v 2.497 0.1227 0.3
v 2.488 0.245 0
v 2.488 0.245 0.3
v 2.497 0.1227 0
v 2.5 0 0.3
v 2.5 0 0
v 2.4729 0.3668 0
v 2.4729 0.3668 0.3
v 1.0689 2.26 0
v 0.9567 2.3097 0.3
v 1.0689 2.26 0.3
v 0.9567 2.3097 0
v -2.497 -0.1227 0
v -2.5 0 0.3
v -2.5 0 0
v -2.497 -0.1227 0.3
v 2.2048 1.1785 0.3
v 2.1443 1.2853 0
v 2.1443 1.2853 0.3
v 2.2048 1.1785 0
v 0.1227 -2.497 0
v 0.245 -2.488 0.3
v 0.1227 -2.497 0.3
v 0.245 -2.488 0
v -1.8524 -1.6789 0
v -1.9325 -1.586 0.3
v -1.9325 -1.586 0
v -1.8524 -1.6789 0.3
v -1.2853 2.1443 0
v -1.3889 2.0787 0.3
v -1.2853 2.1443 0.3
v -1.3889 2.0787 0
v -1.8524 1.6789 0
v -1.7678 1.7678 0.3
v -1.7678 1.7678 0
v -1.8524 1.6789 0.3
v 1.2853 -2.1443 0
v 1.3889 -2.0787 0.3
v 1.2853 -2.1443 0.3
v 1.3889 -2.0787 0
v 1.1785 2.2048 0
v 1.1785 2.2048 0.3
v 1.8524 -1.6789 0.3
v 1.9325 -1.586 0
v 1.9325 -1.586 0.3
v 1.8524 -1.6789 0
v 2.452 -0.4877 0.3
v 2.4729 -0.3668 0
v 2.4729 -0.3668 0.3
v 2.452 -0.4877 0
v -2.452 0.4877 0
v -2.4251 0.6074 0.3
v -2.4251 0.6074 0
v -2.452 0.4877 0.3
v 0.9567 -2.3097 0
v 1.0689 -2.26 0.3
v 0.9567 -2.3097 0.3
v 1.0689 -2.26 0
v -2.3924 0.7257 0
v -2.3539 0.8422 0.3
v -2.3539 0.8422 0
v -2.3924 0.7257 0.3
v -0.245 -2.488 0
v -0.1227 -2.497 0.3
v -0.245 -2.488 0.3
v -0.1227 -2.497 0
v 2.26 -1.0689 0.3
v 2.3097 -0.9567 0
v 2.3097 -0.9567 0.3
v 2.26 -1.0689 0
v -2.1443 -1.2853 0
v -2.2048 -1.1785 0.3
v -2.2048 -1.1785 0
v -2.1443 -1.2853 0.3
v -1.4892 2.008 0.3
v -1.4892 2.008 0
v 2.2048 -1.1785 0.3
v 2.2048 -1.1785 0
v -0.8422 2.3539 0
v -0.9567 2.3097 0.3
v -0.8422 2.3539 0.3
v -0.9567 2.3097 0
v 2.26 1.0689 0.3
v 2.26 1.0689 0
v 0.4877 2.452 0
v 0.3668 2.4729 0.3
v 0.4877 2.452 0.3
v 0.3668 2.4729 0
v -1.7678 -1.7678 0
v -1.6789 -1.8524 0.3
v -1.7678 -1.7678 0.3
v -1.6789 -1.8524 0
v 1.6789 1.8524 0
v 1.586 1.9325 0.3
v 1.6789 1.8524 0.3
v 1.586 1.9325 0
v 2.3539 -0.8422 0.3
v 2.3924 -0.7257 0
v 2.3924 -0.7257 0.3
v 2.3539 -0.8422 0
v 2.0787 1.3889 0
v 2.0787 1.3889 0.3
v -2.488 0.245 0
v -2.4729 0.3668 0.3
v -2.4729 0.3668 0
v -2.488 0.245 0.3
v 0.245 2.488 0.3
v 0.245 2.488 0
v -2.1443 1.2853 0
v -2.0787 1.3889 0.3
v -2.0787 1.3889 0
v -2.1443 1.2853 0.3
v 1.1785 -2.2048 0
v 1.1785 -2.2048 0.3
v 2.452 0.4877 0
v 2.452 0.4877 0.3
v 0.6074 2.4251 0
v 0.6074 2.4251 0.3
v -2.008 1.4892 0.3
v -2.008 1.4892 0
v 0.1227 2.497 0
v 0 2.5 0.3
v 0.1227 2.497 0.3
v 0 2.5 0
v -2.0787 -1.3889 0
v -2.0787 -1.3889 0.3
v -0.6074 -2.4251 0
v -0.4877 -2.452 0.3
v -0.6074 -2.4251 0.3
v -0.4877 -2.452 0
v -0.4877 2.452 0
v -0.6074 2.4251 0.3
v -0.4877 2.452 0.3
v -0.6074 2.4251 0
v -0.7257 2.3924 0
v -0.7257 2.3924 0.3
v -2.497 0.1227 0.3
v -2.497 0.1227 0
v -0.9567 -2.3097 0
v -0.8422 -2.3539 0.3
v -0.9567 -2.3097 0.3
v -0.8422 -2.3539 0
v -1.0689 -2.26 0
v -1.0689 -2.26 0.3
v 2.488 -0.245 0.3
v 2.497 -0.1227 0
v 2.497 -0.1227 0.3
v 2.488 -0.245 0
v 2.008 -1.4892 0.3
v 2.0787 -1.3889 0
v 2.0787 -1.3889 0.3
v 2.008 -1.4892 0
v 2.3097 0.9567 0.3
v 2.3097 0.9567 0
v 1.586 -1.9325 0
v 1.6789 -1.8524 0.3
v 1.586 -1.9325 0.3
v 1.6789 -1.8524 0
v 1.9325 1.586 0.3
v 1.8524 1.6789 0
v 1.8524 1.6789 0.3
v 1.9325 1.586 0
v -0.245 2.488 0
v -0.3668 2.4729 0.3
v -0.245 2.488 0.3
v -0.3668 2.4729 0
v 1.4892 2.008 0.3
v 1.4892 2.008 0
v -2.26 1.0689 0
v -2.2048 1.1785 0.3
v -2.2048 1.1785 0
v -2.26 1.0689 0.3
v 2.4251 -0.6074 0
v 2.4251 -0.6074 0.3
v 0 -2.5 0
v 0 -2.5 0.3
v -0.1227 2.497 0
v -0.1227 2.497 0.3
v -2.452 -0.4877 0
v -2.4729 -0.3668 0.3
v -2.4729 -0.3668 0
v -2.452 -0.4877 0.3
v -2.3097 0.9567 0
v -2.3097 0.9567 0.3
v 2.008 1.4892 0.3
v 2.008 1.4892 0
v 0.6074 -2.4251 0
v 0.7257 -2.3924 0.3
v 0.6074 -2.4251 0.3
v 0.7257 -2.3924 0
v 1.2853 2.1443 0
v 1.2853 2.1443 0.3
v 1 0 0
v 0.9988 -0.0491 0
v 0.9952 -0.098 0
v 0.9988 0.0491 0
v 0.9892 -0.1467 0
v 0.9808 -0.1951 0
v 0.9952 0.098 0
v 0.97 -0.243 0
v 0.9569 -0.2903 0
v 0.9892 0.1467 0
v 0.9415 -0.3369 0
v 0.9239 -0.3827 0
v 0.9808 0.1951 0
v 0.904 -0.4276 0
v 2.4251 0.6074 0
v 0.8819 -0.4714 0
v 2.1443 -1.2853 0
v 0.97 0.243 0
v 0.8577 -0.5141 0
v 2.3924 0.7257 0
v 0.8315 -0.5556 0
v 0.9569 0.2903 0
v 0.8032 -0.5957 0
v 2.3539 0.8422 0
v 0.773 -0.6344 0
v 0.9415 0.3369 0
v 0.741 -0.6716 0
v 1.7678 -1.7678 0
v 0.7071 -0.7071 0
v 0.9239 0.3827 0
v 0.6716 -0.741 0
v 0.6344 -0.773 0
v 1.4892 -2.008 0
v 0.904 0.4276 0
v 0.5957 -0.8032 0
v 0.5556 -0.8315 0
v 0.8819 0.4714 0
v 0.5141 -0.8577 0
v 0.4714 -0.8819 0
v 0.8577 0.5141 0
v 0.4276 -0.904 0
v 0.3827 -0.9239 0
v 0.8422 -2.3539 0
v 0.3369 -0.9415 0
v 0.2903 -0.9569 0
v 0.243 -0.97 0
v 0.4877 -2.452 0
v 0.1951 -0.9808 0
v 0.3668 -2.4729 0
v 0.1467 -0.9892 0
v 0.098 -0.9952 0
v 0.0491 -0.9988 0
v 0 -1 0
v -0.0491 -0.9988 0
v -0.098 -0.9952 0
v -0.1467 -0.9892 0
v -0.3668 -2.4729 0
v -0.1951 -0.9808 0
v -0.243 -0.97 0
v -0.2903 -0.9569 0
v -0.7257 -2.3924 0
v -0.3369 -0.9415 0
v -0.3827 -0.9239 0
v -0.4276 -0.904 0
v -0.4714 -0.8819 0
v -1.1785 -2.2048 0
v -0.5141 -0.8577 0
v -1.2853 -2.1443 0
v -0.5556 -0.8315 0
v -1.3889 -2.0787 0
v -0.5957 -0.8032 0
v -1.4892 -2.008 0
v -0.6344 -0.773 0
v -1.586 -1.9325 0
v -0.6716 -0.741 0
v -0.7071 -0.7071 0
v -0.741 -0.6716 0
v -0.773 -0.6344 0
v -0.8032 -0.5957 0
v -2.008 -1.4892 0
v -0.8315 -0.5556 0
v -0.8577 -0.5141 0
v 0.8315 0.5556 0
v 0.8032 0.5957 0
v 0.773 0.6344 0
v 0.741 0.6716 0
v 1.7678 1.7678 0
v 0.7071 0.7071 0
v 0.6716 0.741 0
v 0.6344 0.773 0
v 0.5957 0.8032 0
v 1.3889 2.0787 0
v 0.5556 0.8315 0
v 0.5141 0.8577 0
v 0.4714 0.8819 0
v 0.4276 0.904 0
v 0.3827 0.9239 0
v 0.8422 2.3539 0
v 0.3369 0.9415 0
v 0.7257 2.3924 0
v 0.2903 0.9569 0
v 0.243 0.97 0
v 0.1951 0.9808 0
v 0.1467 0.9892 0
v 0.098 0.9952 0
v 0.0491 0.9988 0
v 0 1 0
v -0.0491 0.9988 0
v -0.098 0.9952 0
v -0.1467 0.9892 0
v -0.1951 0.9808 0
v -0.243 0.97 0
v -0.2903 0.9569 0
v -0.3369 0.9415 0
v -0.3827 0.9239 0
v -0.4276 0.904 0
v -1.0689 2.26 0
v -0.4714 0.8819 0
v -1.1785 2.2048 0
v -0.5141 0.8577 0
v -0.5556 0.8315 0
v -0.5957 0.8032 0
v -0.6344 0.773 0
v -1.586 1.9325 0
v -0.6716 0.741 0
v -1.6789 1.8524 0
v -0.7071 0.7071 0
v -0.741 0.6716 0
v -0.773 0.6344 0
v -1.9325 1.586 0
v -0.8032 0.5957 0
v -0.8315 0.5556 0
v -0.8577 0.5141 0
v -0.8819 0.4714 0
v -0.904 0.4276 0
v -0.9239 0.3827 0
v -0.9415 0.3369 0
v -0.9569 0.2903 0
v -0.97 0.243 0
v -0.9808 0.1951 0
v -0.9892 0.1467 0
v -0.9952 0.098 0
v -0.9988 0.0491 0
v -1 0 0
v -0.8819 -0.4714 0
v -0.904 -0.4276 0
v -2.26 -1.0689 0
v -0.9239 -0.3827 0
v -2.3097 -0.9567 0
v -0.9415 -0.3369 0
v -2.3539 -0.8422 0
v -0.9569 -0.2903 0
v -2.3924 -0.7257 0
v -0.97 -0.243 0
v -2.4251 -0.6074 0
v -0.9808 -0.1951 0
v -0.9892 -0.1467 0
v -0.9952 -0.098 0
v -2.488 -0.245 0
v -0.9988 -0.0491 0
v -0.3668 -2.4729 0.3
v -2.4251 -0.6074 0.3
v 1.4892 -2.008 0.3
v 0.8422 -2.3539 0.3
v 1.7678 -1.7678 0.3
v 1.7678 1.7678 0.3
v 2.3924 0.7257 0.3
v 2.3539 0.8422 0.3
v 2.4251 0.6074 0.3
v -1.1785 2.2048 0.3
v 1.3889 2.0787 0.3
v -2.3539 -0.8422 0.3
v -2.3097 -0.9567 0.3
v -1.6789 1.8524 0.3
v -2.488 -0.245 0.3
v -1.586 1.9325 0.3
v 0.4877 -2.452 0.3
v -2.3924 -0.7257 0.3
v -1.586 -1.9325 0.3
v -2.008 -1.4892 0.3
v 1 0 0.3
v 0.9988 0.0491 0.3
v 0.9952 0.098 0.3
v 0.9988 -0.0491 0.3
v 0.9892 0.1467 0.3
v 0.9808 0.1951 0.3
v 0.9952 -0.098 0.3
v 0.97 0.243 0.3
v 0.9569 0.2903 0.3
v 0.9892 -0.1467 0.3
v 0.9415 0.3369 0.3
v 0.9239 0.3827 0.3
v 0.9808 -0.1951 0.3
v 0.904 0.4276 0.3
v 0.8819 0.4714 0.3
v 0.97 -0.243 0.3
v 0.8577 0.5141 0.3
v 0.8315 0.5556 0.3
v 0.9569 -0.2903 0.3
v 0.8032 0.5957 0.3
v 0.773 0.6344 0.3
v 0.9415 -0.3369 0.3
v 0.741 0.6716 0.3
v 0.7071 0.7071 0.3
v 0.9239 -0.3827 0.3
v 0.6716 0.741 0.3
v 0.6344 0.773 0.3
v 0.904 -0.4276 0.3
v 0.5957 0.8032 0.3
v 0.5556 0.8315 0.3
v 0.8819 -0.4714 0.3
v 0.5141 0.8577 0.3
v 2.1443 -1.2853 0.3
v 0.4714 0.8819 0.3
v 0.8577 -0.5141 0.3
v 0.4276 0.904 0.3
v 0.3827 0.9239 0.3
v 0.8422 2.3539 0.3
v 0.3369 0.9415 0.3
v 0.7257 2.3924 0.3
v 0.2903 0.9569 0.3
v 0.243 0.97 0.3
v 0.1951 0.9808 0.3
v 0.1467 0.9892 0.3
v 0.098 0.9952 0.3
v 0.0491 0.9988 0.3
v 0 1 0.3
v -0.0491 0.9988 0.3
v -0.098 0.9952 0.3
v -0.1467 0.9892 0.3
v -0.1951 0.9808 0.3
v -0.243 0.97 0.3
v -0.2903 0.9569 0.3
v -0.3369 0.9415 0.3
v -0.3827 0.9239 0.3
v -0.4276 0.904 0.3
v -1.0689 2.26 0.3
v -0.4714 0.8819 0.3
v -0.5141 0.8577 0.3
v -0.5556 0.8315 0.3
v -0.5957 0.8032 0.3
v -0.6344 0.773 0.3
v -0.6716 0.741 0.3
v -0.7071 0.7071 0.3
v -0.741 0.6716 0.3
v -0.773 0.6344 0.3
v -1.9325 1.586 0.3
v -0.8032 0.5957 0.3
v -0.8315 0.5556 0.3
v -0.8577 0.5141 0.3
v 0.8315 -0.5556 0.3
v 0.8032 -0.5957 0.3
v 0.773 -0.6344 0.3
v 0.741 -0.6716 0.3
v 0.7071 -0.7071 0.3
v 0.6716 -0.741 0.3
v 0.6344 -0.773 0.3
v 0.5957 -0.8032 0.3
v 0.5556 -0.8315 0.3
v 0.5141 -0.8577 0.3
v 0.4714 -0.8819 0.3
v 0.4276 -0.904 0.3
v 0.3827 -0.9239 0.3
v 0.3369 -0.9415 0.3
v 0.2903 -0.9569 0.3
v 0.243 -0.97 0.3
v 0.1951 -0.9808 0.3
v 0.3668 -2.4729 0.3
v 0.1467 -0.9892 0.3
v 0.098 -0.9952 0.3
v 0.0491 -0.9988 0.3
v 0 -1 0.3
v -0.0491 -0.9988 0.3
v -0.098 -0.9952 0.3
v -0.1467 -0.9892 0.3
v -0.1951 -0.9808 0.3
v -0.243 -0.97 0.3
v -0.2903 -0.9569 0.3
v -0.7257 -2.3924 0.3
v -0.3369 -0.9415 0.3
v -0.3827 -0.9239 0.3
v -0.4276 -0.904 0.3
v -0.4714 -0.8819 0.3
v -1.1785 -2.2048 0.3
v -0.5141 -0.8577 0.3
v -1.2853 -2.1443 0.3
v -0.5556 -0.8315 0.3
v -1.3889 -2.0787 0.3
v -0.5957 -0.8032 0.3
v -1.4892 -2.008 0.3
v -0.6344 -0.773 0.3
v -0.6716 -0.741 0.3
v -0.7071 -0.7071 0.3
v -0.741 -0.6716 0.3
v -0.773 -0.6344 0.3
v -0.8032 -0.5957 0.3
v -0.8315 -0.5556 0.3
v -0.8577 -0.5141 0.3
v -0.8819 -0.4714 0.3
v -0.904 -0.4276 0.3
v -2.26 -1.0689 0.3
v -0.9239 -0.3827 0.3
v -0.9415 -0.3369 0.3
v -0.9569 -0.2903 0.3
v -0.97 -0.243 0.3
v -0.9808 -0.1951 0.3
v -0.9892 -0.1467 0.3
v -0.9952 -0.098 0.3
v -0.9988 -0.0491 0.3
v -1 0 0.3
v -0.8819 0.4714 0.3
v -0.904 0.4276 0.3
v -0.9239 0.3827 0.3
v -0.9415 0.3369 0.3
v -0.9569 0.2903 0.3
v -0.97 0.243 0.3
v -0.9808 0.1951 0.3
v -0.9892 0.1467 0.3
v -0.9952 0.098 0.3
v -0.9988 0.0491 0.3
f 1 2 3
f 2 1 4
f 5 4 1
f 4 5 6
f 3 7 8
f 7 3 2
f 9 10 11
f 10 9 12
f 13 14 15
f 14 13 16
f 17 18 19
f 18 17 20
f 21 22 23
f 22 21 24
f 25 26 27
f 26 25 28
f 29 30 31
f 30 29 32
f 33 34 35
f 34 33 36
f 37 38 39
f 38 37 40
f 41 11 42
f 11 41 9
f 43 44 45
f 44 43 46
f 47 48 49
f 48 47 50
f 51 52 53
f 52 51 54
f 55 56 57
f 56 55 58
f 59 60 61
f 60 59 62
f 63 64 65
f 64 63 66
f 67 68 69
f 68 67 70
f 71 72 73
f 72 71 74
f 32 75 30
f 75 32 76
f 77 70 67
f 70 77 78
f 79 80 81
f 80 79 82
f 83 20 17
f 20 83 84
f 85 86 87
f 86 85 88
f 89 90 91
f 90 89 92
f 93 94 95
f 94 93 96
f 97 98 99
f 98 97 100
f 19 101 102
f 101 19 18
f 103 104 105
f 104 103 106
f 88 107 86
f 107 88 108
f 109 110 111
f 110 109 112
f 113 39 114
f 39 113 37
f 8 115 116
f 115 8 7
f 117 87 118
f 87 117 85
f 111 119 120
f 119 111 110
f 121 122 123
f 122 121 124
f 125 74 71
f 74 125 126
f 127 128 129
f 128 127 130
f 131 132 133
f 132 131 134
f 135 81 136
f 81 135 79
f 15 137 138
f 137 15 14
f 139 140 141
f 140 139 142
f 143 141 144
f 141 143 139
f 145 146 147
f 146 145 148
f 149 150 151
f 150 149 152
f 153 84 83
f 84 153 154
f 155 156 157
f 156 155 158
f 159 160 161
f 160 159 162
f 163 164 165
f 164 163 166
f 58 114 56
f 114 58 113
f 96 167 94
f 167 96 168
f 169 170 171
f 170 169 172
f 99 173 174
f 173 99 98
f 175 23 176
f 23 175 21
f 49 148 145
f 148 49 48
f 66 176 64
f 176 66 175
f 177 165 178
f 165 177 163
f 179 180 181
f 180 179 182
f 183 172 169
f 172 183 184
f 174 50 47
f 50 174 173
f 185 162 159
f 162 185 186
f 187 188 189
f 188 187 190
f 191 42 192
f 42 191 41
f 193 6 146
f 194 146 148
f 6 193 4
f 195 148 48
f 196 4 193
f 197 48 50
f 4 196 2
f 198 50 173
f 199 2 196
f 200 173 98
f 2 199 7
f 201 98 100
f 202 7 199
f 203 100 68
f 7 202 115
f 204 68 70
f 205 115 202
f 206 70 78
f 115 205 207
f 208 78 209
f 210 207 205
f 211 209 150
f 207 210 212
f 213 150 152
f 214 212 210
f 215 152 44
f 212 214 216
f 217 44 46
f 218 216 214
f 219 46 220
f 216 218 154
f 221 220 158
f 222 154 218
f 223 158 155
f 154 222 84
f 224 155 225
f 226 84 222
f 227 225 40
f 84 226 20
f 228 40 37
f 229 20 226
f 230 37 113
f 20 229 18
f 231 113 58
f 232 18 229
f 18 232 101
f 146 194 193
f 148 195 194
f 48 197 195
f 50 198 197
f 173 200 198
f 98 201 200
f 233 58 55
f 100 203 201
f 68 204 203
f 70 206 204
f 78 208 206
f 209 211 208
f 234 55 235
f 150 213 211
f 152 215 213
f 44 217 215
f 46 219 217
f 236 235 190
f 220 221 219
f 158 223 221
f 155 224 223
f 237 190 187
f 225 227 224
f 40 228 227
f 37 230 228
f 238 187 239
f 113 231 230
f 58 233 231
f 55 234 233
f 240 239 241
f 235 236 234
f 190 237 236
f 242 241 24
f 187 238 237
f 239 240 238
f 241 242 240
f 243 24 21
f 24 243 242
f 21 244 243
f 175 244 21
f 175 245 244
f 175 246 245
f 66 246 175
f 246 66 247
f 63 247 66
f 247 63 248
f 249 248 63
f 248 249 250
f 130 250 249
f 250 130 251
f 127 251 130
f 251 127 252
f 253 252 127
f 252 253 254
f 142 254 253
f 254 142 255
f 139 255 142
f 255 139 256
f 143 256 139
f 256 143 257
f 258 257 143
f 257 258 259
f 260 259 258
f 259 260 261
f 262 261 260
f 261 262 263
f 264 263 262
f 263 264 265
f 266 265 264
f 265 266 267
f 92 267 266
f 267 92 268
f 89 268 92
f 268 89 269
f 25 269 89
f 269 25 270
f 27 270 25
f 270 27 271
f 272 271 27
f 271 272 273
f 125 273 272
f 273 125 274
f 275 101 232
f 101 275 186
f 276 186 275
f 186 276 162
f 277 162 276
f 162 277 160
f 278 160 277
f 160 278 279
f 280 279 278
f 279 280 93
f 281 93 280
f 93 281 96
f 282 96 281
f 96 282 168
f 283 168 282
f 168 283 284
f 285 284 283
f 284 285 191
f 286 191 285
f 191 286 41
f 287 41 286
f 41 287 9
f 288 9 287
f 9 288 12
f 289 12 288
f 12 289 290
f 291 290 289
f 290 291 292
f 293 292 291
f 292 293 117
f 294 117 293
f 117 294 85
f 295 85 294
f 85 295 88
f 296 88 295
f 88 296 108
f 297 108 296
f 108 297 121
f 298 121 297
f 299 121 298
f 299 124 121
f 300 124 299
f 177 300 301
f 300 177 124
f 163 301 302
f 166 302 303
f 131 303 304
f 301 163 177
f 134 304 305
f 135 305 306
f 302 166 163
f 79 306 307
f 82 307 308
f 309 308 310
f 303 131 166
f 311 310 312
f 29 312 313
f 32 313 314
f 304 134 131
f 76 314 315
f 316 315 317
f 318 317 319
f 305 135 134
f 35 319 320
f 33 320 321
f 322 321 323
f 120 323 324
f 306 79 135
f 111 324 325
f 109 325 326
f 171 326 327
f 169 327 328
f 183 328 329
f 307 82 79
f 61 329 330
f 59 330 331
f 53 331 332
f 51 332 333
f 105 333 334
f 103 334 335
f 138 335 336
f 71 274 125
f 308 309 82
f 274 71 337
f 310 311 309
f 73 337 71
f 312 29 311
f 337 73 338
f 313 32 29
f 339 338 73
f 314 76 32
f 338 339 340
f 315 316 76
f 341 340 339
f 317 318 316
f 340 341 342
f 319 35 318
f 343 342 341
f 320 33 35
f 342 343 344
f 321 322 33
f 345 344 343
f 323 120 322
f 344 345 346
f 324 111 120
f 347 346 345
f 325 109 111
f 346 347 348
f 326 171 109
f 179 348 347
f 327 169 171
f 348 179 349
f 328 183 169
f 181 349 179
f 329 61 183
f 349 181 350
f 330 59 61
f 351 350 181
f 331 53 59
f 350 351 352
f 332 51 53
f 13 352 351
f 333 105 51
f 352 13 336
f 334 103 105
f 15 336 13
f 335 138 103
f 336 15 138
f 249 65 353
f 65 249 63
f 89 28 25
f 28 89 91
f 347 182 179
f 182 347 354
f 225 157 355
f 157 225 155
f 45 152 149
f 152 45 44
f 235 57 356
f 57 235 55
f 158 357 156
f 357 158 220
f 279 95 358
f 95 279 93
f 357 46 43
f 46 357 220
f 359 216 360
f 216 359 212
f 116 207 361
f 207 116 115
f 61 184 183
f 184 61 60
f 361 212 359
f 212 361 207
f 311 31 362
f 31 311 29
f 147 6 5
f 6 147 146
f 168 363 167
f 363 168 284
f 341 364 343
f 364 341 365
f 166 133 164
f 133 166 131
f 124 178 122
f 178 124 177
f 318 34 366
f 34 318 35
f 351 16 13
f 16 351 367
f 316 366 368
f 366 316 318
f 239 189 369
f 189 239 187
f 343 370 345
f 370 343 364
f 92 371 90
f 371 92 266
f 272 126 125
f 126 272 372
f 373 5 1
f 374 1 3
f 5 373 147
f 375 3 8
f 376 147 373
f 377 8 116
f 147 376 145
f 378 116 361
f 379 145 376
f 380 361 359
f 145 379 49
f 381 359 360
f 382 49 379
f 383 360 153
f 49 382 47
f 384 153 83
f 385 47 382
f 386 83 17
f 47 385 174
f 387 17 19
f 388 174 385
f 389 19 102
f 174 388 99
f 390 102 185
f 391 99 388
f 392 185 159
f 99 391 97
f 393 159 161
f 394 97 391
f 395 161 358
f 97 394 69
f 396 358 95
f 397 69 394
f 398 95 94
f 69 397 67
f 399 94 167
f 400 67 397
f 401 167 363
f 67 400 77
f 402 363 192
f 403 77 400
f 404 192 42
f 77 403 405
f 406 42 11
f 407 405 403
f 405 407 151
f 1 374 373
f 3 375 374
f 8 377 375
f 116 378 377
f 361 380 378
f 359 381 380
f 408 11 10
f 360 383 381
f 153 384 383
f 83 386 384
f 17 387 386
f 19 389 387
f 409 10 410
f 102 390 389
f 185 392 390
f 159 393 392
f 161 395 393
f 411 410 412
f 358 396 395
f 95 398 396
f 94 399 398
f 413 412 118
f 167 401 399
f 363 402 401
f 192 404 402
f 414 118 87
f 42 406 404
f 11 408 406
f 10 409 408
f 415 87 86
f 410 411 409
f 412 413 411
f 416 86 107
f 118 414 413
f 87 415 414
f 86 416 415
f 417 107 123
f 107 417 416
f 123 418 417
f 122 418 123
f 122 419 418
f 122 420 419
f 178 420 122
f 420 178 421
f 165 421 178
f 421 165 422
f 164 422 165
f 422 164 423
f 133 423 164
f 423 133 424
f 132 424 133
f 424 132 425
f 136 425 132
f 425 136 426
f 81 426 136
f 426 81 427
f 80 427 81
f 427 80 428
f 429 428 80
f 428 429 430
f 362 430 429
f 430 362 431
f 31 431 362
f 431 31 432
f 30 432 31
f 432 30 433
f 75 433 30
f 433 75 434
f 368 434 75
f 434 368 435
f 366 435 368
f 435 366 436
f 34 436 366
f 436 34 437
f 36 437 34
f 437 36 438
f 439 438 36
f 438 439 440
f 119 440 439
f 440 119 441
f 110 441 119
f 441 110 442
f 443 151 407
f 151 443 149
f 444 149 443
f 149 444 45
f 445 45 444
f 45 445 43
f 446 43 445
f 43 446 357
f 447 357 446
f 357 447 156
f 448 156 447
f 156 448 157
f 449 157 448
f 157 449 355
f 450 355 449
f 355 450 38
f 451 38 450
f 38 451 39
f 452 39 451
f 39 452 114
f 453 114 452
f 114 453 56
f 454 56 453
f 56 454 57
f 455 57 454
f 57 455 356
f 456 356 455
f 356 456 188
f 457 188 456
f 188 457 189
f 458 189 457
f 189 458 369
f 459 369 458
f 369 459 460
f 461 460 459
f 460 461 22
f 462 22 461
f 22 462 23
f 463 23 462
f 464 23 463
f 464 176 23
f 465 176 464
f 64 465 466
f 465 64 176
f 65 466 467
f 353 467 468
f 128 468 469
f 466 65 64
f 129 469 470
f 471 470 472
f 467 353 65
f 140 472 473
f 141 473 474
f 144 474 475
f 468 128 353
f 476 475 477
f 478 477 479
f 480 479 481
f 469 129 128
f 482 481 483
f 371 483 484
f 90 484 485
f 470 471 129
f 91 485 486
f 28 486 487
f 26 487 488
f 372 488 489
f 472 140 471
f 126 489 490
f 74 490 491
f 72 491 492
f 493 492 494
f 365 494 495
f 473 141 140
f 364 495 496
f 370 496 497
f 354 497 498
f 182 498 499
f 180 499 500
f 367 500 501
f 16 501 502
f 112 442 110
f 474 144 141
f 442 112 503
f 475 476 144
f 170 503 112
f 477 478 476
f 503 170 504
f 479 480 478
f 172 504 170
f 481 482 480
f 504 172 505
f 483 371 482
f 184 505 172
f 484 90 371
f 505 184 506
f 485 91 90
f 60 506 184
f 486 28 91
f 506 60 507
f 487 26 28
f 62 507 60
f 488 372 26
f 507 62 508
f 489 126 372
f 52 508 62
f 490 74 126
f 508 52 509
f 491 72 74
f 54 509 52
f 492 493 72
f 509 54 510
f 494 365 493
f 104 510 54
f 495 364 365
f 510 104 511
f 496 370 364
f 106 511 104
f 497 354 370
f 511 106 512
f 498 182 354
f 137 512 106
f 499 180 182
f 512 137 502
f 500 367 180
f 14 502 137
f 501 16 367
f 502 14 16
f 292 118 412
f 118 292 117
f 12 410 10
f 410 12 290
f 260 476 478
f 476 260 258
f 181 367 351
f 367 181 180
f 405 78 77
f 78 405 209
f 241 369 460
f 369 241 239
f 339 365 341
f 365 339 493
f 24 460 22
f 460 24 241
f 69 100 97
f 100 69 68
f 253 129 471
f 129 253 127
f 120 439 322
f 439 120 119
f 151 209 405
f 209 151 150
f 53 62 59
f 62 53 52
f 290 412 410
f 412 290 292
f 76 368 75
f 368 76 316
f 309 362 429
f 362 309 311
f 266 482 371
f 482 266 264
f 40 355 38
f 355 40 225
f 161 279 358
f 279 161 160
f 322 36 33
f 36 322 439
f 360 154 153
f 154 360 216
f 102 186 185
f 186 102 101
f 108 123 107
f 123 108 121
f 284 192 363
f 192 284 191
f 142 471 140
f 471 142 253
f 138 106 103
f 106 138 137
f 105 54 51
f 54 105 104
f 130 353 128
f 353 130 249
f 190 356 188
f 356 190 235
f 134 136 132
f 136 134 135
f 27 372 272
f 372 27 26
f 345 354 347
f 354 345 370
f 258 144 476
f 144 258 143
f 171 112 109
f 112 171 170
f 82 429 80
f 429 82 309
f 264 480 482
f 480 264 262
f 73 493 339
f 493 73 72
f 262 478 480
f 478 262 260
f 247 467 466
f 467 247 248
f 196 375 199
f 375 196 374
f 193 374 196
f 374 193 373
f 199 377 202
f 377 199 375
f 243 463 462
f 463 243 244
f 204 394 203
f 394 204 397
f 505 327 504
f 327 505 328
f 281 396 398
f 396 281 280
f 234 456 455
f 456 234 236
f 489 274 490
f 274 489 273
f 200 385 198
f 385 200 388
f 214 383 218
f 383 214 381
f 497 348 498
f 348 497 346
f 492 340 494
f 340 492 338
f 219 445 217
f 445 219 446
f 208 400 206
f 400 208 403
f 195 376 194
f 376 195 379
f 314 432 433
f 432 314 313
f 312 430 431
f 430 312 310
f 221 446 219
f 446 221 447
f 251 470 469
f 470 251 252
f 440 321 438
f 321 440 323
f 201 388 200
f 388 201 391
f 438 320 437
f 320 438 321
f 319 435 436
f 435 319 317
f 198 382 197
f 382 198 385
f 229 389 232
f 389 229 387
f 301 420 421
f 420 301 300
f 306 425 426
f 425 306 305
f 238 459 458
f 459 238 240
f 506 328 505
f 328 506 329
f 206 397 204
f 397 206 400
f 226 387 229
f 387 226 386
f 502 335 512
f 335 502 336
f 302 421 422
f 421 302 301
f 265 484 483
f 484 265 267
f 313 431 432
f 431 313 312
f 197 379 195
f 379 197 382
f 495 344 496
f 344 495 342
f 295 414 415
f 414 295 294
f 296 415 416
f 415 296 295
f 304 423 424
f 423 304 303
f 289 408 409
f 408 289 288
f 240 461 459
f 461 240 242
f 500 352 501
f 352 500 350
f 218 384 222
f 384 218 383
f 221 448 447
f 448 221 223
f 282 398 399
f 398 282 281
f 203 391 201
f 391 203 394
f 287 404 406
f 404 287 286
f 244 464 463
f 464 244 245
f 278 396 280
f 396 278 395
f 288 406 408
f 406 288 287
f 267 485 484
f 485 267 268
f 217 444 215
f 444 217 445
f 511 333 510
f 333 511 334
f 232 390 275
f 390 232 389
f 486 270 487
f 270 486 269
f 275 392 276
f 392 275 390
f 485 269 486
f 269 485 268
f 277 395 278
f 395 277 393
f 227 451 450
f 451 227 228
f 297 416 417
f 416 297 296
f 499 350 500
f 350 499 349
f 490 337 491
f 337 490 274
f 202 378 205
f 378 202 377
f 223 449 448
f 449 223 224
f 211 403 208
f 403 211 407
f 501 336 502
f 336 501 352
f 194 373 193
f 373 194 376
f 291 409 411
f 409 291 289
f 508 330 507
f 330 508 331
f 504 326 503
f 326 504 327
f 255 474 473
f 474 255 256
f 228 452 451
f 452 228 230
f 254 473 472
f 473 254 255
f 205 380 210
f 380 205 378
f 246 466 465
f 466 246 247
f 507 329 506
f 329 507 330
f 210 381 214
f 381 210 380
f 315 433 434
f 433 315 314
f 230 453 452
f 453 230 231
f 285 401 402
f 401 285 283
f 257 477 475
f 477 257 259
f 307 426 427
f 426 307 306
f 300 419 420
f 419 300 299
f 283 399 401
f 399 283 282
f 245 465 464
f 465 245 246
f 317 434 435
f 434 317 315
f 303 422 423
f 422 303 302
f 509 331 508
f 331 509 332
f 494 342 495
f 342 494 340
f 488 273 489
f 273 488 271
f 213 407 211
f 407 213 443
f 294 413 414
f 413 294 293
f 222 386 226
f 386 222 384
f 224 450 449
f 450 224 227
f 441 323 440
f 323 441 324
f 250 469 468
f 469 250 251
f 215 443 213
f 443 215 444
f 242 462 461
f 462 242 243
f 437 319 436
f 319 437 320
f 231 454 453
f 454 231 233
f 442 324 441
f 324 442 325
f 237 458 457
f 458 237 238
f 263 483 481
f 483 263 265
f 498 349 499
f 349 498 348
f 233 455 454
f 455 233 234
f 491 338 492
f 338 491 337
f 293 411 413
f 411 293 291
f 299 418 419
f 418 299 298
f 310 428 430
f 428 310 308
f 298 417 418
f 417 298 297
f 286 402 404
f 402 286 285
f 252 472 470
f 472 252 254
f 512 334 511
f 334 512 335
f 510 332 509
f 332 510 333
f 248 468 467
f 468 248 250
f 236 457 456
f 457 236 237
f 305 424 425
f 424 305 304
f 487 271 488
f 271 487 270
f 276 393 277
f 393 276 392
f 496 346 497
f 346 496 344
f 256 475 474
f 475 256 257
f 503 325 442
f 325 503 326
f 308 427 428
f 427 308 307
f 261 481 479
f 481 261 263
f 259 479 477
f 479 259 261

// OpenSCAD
$fn = 128;

inner_d = 2.0;
outer_d = 5.0;
thickness = 0.3;

difference() {
  cylinder(d = outer_d, h = thickness);
  translate([0, 0, -0.01])
    cylinder(d = inner_d, h = thickness + 0.02);
}
